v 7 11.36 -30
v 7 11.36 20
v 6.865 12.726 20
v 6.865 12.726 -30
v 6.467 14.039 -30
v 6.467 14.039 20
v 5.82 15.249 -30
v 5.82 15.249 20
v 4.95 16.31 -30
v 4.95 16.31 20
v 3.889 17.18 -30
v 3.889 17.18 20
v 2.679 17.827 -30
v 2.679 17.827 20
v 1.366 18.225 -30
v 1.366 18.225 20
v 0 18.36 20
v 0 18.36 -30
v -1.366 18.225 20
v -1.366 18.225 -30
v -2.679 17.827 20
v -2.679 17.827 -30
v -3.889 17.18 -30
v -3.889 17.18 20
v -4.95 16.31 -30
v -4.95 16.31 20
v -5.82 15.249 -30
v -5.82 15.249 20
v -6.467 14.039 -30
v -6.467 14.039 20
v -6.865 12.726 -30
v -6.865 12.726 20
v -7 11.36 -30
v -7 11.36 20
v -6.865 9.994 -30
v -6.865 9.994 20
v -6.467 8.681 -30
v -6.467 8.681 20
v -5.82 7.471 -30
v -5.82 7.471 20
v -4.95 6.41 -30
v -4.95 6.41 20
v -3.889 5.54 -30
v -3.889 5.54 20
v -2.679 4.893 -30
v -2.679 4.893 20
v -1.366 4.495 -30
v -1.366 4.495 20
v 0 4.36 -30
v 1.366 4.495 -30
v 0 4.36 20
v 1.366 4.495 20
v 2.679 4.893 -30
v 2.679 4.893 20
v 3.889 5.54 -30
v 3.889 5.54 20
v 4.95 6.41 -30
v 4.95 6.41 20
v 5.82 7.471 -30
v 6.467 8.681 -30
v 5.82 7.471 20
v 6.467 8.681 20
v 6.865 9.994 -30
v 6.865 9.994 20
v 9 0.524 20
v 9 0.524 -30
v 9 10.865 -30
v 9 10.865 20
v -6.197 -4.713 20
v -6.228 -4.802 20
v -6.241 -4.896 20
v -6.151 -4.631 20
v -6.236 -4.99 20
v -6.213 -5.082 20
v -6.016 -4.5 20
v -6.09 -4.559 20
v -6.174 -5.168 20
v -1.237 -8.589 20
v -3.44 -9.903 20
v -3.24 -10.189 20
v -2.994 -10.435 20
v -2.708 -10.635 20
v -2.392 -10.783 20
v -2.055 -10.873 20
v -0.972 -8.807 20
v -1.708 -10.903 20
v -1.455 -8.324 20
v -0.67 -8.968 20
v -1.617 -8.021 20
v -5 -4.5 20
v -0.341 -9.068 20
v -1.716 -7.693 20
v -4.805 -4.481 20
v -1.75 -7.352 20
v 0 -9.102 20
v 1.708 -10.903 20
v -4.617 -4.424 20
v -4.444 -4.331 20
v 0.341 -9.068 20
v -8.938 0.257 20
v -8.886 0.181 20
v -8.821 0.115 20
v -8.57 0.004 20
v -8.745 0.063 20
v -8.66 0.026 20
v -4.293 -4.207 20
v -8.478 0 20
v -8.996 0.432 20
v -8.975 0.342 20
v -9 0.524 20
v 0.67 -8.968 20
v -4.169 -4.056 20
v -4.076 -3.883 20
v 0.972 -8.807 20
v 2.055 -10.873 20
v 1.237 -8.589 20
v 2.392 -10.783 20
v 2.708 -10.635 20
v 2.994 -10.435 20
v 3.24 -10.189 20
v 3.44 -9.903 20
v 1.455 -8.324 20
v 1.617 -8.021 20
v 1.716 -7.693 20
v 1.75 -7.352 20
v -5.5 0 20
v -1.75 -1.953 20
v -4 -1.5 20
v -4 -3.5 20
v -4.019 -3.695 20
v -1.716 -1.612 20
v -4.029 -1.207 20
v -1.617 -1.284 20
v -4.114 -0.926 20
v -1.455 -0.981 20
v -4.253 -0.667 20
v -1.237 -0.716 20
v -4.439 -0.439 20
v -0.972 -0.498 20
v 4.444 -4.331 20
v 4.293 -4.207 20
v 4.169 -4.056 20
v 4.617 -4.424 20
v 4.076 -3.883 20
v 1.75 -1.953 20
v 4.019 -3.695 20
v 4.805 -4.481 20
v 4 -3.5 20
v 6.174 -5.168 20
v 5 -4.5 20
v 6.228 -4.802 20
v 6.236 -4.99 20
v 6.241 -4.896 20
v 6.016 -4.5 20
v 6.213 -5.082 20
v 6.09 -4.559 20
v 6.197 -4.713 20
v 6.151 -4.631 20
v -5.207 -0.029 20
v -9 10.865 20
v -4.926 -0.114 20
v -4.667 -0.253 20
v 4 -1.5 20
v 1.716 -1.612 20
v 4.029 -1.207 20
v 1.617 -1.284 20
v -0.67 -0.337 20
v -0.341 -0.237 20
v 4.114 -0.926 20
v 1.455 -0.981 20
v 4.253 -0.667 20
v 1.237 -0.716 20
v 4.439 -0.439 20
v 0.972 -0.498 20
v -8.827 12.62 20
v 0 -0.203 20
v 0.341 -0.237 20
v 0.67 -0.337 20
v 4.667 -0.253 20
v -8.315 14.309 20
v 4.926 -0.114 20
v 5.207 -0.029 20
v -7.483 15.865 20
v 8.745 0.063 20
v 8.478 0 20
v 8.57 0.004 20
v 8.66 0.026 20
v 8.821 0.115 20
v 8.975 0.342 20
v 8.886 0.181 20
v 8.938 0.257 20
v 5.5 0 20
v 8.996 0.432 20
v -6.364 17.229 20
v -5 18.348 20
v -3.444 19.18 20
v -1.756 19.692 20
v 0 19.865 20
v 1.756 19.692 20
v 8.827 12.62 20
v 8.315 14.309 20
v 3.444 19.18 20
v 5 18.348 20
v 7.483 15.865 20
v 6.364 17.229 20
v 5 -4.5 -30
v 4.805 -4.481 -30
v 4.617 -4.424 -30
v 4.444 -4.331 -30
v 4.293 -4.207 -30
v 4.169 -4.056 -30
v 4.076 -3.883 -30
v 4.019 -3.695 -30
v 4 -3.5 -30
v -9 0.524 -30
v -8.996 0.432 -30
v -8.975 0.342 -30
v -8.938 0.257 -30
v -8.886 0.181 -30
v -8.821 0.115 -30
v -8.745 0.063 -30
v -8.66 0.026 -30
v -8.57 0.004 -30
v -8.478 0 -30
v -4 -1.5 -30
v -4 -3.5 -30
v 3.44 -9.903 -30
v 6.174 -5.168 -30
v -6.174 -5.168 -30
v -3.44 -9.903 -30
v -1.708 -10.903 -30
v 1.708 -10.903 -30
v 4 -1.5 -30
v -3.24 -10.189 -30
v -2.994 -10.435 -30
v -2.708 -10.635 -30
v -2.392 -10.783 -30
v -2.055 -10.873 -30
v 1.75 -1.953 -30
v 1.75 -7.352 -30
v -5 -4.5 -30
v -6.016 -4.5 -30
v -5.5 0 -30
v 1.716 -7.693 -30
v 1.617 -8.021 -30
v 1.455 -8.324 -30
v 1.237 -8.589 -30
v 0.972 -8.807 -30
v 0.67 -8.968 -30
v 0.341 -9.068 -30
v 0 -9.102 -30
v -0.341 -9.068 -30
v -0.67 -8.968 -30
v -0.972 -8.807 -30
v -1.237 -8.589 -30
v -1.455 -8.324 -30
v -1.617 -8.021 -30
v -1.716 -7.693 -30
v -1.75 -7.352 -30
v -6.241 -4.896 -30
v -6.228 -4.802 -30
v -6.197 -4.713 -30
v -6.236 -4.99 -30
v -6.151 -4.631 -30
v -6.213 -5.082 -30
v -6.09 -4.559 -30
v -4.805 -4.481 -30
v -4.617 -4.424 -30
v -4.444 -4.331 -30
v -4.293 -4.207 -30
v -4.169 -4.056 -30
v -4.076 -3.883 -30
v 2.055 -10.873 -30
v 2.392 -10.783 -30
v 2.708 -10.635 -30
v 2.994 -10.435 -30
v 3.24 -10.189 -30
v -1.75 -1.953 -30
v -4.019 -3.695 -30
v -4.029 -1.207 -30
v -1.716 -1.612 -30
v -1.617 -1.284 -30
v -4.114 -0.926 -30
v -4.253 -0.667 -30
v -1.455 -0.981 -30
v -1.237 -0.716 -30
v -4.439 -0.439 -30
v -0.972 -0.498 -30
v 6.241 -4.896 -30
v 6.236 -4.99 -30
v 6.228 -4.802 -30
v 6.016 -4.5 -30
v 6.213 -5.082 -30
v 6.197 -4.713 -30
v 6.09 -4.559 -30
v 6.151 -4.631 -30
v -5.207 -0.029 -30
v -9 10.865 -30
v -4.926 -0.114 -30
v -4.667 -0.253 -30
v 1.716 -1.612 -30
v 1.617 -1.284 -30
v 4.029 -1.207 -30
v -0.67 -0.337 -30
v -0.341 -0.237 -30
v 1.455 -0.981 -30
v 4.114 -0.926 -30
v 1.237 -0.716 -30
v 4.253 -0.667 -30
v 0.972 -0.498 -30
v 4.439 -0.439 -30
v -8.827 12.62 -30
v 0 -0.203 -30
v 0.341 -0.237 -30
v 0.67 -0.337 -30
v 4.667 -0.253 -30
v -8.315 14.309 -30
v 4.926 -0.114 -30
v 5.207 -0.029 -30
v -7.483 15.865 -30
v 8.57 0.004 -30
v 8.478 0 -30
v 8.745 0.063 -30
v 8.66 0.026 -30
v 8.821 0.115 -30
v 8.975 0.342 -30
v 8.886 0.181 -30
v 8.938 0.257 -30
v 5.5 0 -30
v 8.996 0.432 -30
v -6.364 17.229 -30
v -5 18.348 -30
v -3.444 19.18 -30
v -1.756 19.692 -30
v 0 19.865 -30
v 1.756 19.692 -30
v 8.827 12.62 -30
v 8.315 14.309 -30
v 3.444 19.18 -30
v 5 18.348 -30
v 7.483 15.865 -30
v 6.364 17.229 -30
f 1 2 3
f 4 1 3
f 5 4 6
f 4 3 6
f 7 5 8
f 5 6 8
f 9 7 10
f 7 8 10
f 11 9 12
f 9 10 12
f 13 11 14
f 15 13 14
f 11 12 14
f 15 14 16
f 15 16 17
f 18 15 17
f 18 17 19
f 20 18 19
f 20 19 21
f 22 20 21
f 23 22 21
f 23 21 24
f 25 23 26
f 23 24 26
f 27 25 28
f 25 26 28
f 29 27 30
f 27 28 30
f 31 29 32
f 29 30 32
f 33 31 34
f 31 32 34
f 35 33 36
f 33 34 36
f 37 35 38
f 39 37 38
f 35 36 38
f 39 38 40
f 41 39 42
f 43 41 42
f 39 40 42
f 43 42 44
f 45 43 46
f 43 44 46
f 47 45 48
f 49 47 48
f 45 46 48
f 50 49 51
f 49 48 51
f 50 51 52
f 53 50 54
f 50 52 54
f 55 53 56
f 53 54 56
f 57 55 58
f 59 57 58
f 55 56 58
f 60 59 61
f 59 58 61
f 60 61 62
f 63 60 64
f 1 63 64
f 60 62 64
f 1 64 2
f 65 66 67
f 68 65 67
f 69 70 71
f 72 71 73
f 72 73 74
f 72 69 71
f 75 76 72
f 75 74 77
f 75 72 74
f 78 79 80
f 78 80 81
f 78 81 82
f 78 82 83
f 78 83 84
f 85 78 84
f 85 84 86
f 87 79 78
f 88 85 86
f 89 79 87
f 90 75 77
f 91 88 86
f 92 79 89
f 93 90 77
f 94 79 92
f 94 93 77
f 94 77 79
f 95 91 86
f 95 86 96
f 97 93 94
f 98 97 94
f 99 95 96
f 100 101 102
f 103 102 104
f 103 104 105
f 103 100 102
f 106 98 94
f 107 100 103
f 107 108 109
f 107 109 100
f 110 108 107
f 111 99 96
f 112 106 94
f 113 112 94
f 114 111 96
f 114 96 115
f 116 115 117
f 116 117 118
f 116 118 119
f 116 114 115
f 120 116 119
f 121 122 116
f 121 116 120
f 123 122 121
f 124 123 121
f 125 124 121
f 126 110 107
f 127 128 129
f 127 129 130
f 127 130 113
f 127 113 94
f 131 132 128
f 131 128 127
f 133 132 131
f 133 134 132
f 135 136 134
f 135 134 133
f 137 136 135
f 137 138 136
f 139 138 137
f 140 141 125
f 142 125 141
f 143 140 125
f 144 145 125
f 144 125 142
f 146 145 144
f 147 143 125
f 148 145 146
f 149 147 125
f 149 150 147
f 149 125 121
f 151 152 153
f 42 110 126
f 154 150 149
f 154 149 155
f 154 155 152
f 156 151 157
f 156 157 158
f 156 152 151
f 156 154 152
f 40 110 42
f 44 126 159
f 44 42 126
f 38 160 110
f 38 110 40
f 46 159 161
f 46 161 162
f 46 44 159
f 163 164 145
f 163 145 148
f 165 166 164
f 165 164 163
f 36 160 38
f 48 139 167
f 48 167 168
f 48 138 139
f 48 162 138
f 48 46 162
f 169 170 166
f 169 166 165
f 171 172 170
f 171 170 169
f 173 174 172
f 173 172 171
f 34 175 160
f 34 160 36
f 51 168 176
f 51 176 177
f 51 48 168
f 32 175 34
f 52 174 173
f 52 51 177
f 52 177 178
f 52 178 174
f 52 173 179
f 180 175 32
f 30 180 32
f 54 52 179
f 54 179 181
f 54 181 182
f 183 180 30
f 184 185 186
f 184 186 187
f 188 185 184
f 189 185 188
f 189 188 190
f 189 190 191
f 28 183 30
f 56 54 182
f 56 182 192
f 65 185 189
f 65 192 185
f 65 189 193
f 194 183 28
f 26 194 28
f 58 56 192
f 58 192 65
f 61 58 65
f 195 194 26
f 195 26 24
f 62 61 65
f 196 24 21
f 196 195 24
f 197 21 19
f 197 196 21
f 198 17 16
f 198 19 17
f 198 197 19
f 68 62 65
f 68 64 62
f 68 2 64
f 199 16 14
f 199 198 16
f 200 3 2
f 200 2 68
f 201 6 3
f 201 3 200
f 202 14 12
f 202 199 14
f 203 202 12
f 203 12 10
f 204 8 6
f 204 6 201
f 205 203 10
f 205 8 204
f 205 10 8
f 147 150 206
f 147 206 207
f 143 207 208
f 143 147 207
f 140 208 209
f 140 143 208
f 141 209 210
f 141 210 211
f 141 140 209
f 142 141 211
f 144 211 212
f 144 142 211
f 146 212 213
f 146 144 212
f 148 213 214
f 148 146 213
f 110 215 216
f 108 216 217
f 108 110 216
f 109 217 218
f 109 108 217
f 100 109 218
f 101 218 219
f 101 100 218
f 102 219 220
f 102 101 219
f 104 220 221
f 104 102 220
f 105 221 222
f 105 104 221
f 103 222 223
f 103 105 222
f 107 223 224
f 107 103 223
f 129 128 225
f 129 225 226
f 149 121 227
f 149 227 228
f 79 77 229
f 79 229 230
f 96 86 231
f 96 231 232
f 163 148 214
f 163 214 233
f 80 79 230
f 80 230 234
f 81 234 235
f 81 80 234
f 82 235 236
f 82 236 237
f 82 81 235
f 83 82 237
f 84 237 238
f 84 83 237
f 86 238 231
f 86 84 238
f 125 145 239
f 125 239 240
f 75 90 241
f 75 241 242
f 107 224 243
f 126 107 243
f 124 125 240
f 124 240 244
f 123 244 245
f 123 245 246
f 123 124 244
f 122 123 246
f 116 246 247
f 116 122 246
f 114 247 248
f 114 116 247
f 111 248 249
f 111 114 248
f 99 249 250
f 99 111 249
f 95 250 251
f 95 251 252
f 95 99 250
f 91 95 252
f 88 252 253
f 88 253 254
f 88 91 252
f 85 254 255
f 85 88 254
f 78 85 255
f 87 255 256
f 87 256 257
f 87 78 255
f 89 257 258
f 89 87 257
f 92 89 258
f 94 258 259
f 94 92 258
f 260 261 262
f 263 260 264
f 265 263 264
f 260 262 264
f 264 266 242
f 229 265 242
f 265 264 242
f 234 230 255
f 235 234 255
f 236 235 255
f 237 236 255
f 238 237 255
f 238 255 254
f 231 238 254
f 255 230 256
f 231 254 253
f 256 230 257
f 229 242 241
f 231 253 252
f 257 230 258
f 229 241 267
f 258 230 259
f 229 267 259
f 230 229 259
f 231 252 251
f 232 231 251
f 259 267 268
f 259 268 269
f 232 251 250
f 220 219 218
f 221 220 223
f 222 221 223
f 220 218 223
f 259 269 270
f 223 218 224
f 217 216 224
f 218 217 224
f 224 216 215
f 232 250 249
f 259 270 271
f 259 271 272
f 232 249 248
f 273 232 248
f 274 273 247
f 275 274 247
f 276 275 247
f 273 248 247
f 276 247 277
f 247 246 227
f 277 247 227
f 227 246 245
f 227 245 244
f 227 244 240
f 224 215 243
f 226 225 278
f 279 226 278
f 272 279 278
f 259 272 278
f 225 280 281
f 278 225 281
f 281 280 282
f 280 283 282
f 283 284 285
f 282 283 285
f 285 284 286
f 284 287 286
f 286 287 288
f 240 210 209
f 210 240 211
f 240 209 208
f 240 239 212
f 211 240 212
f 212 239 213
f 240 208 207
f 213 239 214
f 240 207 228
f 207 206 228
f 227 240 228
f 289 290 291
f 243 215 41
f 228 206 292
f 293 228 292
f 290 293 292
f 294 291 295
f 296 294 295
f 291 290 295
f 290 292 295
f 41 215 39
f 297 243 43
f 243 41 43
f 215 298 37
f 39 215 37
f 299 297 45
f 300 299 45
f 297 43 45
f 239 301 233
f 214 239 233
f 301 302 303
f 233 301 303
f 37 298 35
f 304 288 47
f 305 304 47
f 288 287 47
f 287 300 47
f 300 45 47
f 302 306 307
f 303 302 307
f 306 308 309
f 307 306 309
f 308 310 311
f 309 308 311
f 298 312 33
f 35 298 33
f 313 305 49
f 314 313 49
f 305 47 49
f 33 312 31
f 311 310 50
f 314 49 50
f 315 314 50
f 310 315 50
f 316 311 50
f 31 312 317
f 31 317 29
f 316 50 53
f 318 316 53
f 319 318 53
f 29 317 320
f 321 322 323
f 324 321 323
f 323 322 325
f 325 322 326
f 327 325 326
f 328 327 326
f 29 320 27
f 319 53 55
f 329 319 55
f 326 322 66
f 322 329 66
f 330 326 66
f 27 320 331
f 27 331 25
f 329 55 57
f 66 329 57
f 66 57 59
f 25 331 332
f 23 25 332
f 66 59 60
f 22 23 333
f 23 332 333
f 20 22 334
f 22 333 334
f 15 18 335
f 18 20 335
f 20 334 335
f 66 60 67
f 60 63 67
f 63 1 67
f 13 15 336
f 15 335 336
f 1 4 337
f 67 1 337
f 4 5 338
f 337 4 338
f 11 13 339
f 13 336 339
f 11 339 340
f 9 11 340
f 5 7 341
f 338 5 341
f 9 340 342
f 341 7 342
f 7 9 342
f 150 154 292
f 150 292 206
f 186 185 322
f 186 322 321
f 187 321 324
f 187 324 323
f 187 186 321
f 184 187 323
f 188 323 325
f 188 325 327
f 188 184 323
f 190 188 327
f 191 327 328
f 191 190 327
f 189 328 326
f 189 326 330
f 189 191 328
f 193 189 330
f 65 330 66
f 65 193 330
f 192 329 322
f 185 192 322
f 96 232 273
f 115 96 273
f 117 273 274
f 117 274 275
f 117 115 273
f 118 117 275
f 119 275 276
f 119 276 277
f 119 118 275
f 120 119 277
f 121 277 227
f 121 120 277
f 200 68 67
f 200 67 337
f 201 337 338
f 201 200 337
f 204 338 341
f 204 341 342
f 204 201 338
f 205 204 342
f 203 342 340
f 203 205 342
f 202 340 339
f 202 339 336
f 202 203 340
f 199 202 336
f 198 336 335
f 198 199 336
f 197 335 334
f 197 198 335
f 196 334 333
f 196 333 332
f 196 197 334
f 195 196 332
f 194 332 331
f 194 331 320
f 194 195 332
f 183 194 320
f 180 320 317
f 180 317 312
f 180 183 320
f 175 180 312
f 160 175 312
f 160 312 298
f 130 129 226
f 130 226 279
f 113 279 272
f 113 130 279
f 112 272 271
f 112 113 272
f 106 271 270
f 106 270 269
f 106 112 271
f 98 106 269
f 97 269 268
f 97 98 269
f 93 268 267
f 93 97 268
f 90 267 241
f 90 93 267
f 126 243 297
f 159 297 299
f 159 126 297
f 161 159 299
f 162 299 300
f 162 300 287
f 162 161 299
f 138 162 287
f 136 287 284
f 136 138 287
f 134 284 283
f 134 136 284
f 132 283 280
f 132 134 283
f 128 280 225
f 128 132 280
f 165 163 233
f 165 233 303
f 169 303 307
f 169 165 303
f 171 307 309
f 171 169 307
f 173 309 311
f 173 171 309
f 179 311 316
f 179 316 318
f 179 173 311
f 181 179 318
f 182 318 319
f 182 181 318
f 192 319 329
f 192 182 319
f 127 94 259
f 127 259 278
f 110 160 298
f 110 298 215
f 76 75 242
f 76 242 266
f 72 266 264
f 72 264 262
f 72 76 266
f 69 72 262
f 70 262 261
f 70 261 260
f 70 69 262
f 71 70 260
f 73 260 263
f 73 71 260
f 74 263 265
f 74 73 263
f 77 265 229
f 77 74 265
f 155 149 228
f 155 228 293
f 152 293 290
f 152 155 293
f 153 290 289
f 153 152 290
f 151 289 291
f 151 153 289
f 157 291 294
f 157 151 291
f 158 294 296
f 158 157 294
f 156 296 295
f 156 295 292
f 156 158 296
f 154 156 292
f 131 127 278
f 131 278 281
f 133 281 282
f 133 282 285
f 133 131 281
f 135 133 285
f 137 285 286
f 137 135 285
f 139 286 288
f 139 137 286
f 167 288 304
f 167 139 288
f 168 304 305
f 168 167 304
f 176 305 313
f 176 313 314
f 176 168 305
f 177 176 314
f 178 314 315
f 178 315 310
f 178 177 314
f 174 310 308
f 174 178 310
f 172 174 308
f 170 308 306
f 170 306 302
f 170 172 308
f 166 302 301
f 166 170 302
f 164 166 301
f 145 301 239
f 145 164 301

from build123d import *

# Parameters (mm, degrees)
ESQUISSE1_R        = 7
BOSS_EXTRU_1_DEPTH = 50


with BuildPart() as part:
    # Esquisse1 → Boss.-Extru.1 (new body)
    with BuildSketch(Plane.XY.offset(20)):
        with BuildLine():
            Line((-9, 10.864586864), (-9, 0.523924837))
            ThreePointArc((-9, 0.523924837), (-8.854824532, 0.14661401), (-8.478070356, 0))
            Line((-8.478070356, 0), (-5.5, 0))
            ThreePointArc((-5.5, 0), (-4.439339828, -0.439339828), (-4, -1.5))
            Line((-4, -1.5), (-4, -3.5))
            ThreePointArc((-4, -3.5), (-4.292893219, -4.207106781), (-5, -4.5))
            Line((-5, -4.5), (-6.016007613, -4.5))
            ThreePointArc((-6.016007613, -4.5), (-6.227713349, -4.802430523), (-6.174193657, -5.16769643))
            Line((-6.174193657, -5.16769643), (-3.440043573, -9.90338329))
            ThreePointArc((-3.440043573, -9.90338329), (-2.707992766, -10.635434098), (-1.707992766, -10.90338329))
            Line((-1.707992766, -10.90338329), (1.707992766, -10.90338329))
            ThreePointArc((1.707992766, -10.90338329), (2.707992766, -10.635434098), (3.440043573, -9.90338329))
            Line((3.440043573, -9.90338329), (6.174193657, -5.16769643))
            ThreePointArc((6.174193657, -5.16769643), (6.227713349, -4.802430523), (6.016007614, -4.5))
            Line((6.016007614, -4.5), (5, -4.5))
            ThreePointArc((5, -4.5), (4.292893219, -4.207106781), (4, -3.5))
            Line((4, -3.5), (4, -1.5))
            ThreePointArc((4, -1.5), (4.439339828, -0.439339828), (5.5, 0))
            Line((5.5, 0), (8.478070356, 0))
            ThreePointArc((8.478070356, 0), (8.854824532, 0.14661401), (9, 0.523924837))
            Line((9, 0.523924837), (9, 10.864586864))
            ThreePointArc((9, 10.864586864), (0, 19.864586864), (-9, 10.864586864))
        make_face()
        with Locations((0, 11.36)):
            Circle(ESQUISSE1_R, mode=Mode.SUBTRACT)
        with BuildLine():
            Line((1.75, -1.95338329), (1.75, -7.351528839))
            ThreePointArc((1.75, -7.351528839), (0, -9.101528839), (-1.75, -7.351528839))
            Line((-1.75, -7.351528839), (-1.75, -1.95338329))
            ThreePointArc((-1.75, -1.95338329), (0, -0.20338329), (1.75, -1.95338329))
        make_face(mode=Mode.SUBTRACT)
    extrude(amount=-BOSS_EXTRU_1_DEPTH)


solid = part.part
